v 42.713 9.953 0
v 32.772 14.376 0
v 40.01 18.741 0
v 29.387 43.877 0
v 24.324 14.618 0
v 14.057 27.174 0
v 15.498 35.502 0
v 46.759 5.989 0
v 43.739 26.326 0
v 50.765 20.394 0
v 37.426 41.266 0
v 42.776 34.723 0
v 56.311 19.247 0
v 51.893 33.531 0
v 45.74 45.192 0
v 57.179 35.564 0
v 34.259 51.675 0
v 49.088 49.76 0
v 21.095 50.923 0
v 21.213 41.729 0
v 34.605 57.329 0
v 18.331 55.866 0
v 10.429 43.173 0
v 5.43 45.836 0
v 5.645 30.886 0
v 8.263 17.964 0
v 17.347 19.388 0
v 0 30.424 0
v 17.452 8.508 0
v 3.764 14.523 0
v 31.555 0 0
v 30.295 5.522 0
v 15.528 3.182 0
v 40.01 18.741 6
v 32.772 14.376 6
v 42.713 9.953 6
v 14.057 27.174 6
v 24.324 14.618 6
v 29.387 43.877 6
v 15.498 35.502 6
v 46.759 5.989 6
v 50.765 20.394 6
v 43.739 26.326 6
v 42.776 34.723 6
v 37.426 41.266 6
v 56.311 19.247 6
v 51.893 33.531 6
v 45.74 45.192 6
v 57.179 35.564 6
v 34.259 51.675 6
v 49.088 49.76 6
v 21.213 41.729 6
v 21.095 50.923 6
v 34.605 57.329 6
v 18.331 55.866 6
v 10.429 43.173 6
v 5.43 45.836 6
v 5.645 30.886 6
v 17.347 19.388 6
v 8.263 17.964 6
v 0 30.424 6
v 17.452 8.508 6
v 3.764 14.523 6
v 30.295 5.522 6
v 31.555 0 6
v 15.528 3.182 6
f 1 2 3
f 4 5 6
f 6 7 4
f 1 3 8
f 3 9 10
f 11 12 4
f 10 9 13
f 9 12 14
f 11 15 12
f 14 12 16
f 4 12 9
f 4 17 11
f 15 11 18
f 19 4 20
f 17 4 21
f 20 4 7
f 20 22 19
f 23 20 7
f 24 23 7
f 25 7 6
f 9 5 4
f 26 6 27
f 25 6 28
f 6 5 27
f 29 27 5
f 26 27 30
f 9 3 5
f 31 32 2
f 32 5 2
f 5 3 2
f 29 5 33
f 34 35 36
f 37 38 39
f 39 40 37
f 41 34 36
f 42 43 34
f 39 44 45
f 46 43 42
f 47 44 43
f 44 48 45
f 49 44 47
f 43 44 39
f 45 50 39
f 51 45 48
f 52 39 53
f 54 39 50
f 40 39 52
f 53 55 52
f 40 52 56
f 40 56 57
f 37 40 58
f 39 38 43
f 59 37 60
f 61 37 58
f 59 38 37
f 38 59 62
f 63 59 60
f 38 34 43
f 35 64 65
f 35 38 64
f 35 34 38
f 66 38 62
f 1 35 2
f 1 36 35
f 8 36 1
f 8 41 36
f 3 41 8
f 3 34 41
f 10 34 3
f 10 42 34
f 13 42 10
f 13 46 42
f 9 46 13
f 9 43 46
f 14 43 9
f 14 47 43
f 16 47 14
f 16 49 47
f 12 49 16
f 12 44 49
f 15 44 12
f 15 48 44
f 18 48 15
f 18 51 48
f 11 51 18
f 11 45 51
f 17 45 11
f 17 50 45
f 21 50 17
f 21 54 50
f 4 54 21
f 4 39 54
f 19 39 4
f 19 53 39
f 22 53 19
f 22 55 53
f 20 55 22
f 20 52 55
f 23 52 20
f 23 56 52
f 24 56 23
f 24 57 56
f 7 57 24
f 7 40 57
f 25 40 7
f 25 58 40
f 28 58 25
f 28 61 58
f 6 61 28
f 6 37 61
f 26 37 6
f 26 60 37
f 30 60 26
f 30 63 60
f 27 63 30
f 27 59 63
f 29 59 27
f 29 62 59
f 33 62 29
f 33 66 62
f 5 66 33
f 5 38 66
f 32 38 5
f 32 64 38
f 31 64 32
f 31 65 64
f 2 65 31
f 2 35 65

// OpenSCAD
$fn = 32;

// ----------------------------------------------------------------------
// Fan rotor section: 11 blades, 15 mm hub radius, 14 mm blades
// ----------------------------------------------------------------------

// --- parameters (mm) ---
profile_height = 6;       // extrusion height
profile_points = 33;      // points of the closed outline

profile = [[43.739, 26.326], [51.893, 33.531], [57.179, 35.564], [42.776, 34.723], [45.74, 45.192], [49.088, 49.76], [37.426, 41.266], [34.259, 51.675], [34.605, 57.329], [29.387, 43.877], [21.095, 50.923], [18.331, 55.866], [21.213, 41.729], [10.429, 43.173], [5.43, 45.836], [15.498, 35.502], [5.645, 30.886], [0, 30.424], [14.057, 27.174], [8.263, 17.964], [3.764, 14.523], [17.347, 19.388], [17.452, 8.508], [15.528, 3.182], [24.324, 14.618], [30.295, 5.522], [31.555, 0], [32.772, 14.376], [42.713, 9.953], [46.759, 5.989], [40.01, 18.741], [50.765, 20.394], [56.311, 19.247]];  // single closed polygon, 33 points, counter clockwise

// --- the one profile operation ---
linear_extrude(height = profile_height) polygon(points = profile);
